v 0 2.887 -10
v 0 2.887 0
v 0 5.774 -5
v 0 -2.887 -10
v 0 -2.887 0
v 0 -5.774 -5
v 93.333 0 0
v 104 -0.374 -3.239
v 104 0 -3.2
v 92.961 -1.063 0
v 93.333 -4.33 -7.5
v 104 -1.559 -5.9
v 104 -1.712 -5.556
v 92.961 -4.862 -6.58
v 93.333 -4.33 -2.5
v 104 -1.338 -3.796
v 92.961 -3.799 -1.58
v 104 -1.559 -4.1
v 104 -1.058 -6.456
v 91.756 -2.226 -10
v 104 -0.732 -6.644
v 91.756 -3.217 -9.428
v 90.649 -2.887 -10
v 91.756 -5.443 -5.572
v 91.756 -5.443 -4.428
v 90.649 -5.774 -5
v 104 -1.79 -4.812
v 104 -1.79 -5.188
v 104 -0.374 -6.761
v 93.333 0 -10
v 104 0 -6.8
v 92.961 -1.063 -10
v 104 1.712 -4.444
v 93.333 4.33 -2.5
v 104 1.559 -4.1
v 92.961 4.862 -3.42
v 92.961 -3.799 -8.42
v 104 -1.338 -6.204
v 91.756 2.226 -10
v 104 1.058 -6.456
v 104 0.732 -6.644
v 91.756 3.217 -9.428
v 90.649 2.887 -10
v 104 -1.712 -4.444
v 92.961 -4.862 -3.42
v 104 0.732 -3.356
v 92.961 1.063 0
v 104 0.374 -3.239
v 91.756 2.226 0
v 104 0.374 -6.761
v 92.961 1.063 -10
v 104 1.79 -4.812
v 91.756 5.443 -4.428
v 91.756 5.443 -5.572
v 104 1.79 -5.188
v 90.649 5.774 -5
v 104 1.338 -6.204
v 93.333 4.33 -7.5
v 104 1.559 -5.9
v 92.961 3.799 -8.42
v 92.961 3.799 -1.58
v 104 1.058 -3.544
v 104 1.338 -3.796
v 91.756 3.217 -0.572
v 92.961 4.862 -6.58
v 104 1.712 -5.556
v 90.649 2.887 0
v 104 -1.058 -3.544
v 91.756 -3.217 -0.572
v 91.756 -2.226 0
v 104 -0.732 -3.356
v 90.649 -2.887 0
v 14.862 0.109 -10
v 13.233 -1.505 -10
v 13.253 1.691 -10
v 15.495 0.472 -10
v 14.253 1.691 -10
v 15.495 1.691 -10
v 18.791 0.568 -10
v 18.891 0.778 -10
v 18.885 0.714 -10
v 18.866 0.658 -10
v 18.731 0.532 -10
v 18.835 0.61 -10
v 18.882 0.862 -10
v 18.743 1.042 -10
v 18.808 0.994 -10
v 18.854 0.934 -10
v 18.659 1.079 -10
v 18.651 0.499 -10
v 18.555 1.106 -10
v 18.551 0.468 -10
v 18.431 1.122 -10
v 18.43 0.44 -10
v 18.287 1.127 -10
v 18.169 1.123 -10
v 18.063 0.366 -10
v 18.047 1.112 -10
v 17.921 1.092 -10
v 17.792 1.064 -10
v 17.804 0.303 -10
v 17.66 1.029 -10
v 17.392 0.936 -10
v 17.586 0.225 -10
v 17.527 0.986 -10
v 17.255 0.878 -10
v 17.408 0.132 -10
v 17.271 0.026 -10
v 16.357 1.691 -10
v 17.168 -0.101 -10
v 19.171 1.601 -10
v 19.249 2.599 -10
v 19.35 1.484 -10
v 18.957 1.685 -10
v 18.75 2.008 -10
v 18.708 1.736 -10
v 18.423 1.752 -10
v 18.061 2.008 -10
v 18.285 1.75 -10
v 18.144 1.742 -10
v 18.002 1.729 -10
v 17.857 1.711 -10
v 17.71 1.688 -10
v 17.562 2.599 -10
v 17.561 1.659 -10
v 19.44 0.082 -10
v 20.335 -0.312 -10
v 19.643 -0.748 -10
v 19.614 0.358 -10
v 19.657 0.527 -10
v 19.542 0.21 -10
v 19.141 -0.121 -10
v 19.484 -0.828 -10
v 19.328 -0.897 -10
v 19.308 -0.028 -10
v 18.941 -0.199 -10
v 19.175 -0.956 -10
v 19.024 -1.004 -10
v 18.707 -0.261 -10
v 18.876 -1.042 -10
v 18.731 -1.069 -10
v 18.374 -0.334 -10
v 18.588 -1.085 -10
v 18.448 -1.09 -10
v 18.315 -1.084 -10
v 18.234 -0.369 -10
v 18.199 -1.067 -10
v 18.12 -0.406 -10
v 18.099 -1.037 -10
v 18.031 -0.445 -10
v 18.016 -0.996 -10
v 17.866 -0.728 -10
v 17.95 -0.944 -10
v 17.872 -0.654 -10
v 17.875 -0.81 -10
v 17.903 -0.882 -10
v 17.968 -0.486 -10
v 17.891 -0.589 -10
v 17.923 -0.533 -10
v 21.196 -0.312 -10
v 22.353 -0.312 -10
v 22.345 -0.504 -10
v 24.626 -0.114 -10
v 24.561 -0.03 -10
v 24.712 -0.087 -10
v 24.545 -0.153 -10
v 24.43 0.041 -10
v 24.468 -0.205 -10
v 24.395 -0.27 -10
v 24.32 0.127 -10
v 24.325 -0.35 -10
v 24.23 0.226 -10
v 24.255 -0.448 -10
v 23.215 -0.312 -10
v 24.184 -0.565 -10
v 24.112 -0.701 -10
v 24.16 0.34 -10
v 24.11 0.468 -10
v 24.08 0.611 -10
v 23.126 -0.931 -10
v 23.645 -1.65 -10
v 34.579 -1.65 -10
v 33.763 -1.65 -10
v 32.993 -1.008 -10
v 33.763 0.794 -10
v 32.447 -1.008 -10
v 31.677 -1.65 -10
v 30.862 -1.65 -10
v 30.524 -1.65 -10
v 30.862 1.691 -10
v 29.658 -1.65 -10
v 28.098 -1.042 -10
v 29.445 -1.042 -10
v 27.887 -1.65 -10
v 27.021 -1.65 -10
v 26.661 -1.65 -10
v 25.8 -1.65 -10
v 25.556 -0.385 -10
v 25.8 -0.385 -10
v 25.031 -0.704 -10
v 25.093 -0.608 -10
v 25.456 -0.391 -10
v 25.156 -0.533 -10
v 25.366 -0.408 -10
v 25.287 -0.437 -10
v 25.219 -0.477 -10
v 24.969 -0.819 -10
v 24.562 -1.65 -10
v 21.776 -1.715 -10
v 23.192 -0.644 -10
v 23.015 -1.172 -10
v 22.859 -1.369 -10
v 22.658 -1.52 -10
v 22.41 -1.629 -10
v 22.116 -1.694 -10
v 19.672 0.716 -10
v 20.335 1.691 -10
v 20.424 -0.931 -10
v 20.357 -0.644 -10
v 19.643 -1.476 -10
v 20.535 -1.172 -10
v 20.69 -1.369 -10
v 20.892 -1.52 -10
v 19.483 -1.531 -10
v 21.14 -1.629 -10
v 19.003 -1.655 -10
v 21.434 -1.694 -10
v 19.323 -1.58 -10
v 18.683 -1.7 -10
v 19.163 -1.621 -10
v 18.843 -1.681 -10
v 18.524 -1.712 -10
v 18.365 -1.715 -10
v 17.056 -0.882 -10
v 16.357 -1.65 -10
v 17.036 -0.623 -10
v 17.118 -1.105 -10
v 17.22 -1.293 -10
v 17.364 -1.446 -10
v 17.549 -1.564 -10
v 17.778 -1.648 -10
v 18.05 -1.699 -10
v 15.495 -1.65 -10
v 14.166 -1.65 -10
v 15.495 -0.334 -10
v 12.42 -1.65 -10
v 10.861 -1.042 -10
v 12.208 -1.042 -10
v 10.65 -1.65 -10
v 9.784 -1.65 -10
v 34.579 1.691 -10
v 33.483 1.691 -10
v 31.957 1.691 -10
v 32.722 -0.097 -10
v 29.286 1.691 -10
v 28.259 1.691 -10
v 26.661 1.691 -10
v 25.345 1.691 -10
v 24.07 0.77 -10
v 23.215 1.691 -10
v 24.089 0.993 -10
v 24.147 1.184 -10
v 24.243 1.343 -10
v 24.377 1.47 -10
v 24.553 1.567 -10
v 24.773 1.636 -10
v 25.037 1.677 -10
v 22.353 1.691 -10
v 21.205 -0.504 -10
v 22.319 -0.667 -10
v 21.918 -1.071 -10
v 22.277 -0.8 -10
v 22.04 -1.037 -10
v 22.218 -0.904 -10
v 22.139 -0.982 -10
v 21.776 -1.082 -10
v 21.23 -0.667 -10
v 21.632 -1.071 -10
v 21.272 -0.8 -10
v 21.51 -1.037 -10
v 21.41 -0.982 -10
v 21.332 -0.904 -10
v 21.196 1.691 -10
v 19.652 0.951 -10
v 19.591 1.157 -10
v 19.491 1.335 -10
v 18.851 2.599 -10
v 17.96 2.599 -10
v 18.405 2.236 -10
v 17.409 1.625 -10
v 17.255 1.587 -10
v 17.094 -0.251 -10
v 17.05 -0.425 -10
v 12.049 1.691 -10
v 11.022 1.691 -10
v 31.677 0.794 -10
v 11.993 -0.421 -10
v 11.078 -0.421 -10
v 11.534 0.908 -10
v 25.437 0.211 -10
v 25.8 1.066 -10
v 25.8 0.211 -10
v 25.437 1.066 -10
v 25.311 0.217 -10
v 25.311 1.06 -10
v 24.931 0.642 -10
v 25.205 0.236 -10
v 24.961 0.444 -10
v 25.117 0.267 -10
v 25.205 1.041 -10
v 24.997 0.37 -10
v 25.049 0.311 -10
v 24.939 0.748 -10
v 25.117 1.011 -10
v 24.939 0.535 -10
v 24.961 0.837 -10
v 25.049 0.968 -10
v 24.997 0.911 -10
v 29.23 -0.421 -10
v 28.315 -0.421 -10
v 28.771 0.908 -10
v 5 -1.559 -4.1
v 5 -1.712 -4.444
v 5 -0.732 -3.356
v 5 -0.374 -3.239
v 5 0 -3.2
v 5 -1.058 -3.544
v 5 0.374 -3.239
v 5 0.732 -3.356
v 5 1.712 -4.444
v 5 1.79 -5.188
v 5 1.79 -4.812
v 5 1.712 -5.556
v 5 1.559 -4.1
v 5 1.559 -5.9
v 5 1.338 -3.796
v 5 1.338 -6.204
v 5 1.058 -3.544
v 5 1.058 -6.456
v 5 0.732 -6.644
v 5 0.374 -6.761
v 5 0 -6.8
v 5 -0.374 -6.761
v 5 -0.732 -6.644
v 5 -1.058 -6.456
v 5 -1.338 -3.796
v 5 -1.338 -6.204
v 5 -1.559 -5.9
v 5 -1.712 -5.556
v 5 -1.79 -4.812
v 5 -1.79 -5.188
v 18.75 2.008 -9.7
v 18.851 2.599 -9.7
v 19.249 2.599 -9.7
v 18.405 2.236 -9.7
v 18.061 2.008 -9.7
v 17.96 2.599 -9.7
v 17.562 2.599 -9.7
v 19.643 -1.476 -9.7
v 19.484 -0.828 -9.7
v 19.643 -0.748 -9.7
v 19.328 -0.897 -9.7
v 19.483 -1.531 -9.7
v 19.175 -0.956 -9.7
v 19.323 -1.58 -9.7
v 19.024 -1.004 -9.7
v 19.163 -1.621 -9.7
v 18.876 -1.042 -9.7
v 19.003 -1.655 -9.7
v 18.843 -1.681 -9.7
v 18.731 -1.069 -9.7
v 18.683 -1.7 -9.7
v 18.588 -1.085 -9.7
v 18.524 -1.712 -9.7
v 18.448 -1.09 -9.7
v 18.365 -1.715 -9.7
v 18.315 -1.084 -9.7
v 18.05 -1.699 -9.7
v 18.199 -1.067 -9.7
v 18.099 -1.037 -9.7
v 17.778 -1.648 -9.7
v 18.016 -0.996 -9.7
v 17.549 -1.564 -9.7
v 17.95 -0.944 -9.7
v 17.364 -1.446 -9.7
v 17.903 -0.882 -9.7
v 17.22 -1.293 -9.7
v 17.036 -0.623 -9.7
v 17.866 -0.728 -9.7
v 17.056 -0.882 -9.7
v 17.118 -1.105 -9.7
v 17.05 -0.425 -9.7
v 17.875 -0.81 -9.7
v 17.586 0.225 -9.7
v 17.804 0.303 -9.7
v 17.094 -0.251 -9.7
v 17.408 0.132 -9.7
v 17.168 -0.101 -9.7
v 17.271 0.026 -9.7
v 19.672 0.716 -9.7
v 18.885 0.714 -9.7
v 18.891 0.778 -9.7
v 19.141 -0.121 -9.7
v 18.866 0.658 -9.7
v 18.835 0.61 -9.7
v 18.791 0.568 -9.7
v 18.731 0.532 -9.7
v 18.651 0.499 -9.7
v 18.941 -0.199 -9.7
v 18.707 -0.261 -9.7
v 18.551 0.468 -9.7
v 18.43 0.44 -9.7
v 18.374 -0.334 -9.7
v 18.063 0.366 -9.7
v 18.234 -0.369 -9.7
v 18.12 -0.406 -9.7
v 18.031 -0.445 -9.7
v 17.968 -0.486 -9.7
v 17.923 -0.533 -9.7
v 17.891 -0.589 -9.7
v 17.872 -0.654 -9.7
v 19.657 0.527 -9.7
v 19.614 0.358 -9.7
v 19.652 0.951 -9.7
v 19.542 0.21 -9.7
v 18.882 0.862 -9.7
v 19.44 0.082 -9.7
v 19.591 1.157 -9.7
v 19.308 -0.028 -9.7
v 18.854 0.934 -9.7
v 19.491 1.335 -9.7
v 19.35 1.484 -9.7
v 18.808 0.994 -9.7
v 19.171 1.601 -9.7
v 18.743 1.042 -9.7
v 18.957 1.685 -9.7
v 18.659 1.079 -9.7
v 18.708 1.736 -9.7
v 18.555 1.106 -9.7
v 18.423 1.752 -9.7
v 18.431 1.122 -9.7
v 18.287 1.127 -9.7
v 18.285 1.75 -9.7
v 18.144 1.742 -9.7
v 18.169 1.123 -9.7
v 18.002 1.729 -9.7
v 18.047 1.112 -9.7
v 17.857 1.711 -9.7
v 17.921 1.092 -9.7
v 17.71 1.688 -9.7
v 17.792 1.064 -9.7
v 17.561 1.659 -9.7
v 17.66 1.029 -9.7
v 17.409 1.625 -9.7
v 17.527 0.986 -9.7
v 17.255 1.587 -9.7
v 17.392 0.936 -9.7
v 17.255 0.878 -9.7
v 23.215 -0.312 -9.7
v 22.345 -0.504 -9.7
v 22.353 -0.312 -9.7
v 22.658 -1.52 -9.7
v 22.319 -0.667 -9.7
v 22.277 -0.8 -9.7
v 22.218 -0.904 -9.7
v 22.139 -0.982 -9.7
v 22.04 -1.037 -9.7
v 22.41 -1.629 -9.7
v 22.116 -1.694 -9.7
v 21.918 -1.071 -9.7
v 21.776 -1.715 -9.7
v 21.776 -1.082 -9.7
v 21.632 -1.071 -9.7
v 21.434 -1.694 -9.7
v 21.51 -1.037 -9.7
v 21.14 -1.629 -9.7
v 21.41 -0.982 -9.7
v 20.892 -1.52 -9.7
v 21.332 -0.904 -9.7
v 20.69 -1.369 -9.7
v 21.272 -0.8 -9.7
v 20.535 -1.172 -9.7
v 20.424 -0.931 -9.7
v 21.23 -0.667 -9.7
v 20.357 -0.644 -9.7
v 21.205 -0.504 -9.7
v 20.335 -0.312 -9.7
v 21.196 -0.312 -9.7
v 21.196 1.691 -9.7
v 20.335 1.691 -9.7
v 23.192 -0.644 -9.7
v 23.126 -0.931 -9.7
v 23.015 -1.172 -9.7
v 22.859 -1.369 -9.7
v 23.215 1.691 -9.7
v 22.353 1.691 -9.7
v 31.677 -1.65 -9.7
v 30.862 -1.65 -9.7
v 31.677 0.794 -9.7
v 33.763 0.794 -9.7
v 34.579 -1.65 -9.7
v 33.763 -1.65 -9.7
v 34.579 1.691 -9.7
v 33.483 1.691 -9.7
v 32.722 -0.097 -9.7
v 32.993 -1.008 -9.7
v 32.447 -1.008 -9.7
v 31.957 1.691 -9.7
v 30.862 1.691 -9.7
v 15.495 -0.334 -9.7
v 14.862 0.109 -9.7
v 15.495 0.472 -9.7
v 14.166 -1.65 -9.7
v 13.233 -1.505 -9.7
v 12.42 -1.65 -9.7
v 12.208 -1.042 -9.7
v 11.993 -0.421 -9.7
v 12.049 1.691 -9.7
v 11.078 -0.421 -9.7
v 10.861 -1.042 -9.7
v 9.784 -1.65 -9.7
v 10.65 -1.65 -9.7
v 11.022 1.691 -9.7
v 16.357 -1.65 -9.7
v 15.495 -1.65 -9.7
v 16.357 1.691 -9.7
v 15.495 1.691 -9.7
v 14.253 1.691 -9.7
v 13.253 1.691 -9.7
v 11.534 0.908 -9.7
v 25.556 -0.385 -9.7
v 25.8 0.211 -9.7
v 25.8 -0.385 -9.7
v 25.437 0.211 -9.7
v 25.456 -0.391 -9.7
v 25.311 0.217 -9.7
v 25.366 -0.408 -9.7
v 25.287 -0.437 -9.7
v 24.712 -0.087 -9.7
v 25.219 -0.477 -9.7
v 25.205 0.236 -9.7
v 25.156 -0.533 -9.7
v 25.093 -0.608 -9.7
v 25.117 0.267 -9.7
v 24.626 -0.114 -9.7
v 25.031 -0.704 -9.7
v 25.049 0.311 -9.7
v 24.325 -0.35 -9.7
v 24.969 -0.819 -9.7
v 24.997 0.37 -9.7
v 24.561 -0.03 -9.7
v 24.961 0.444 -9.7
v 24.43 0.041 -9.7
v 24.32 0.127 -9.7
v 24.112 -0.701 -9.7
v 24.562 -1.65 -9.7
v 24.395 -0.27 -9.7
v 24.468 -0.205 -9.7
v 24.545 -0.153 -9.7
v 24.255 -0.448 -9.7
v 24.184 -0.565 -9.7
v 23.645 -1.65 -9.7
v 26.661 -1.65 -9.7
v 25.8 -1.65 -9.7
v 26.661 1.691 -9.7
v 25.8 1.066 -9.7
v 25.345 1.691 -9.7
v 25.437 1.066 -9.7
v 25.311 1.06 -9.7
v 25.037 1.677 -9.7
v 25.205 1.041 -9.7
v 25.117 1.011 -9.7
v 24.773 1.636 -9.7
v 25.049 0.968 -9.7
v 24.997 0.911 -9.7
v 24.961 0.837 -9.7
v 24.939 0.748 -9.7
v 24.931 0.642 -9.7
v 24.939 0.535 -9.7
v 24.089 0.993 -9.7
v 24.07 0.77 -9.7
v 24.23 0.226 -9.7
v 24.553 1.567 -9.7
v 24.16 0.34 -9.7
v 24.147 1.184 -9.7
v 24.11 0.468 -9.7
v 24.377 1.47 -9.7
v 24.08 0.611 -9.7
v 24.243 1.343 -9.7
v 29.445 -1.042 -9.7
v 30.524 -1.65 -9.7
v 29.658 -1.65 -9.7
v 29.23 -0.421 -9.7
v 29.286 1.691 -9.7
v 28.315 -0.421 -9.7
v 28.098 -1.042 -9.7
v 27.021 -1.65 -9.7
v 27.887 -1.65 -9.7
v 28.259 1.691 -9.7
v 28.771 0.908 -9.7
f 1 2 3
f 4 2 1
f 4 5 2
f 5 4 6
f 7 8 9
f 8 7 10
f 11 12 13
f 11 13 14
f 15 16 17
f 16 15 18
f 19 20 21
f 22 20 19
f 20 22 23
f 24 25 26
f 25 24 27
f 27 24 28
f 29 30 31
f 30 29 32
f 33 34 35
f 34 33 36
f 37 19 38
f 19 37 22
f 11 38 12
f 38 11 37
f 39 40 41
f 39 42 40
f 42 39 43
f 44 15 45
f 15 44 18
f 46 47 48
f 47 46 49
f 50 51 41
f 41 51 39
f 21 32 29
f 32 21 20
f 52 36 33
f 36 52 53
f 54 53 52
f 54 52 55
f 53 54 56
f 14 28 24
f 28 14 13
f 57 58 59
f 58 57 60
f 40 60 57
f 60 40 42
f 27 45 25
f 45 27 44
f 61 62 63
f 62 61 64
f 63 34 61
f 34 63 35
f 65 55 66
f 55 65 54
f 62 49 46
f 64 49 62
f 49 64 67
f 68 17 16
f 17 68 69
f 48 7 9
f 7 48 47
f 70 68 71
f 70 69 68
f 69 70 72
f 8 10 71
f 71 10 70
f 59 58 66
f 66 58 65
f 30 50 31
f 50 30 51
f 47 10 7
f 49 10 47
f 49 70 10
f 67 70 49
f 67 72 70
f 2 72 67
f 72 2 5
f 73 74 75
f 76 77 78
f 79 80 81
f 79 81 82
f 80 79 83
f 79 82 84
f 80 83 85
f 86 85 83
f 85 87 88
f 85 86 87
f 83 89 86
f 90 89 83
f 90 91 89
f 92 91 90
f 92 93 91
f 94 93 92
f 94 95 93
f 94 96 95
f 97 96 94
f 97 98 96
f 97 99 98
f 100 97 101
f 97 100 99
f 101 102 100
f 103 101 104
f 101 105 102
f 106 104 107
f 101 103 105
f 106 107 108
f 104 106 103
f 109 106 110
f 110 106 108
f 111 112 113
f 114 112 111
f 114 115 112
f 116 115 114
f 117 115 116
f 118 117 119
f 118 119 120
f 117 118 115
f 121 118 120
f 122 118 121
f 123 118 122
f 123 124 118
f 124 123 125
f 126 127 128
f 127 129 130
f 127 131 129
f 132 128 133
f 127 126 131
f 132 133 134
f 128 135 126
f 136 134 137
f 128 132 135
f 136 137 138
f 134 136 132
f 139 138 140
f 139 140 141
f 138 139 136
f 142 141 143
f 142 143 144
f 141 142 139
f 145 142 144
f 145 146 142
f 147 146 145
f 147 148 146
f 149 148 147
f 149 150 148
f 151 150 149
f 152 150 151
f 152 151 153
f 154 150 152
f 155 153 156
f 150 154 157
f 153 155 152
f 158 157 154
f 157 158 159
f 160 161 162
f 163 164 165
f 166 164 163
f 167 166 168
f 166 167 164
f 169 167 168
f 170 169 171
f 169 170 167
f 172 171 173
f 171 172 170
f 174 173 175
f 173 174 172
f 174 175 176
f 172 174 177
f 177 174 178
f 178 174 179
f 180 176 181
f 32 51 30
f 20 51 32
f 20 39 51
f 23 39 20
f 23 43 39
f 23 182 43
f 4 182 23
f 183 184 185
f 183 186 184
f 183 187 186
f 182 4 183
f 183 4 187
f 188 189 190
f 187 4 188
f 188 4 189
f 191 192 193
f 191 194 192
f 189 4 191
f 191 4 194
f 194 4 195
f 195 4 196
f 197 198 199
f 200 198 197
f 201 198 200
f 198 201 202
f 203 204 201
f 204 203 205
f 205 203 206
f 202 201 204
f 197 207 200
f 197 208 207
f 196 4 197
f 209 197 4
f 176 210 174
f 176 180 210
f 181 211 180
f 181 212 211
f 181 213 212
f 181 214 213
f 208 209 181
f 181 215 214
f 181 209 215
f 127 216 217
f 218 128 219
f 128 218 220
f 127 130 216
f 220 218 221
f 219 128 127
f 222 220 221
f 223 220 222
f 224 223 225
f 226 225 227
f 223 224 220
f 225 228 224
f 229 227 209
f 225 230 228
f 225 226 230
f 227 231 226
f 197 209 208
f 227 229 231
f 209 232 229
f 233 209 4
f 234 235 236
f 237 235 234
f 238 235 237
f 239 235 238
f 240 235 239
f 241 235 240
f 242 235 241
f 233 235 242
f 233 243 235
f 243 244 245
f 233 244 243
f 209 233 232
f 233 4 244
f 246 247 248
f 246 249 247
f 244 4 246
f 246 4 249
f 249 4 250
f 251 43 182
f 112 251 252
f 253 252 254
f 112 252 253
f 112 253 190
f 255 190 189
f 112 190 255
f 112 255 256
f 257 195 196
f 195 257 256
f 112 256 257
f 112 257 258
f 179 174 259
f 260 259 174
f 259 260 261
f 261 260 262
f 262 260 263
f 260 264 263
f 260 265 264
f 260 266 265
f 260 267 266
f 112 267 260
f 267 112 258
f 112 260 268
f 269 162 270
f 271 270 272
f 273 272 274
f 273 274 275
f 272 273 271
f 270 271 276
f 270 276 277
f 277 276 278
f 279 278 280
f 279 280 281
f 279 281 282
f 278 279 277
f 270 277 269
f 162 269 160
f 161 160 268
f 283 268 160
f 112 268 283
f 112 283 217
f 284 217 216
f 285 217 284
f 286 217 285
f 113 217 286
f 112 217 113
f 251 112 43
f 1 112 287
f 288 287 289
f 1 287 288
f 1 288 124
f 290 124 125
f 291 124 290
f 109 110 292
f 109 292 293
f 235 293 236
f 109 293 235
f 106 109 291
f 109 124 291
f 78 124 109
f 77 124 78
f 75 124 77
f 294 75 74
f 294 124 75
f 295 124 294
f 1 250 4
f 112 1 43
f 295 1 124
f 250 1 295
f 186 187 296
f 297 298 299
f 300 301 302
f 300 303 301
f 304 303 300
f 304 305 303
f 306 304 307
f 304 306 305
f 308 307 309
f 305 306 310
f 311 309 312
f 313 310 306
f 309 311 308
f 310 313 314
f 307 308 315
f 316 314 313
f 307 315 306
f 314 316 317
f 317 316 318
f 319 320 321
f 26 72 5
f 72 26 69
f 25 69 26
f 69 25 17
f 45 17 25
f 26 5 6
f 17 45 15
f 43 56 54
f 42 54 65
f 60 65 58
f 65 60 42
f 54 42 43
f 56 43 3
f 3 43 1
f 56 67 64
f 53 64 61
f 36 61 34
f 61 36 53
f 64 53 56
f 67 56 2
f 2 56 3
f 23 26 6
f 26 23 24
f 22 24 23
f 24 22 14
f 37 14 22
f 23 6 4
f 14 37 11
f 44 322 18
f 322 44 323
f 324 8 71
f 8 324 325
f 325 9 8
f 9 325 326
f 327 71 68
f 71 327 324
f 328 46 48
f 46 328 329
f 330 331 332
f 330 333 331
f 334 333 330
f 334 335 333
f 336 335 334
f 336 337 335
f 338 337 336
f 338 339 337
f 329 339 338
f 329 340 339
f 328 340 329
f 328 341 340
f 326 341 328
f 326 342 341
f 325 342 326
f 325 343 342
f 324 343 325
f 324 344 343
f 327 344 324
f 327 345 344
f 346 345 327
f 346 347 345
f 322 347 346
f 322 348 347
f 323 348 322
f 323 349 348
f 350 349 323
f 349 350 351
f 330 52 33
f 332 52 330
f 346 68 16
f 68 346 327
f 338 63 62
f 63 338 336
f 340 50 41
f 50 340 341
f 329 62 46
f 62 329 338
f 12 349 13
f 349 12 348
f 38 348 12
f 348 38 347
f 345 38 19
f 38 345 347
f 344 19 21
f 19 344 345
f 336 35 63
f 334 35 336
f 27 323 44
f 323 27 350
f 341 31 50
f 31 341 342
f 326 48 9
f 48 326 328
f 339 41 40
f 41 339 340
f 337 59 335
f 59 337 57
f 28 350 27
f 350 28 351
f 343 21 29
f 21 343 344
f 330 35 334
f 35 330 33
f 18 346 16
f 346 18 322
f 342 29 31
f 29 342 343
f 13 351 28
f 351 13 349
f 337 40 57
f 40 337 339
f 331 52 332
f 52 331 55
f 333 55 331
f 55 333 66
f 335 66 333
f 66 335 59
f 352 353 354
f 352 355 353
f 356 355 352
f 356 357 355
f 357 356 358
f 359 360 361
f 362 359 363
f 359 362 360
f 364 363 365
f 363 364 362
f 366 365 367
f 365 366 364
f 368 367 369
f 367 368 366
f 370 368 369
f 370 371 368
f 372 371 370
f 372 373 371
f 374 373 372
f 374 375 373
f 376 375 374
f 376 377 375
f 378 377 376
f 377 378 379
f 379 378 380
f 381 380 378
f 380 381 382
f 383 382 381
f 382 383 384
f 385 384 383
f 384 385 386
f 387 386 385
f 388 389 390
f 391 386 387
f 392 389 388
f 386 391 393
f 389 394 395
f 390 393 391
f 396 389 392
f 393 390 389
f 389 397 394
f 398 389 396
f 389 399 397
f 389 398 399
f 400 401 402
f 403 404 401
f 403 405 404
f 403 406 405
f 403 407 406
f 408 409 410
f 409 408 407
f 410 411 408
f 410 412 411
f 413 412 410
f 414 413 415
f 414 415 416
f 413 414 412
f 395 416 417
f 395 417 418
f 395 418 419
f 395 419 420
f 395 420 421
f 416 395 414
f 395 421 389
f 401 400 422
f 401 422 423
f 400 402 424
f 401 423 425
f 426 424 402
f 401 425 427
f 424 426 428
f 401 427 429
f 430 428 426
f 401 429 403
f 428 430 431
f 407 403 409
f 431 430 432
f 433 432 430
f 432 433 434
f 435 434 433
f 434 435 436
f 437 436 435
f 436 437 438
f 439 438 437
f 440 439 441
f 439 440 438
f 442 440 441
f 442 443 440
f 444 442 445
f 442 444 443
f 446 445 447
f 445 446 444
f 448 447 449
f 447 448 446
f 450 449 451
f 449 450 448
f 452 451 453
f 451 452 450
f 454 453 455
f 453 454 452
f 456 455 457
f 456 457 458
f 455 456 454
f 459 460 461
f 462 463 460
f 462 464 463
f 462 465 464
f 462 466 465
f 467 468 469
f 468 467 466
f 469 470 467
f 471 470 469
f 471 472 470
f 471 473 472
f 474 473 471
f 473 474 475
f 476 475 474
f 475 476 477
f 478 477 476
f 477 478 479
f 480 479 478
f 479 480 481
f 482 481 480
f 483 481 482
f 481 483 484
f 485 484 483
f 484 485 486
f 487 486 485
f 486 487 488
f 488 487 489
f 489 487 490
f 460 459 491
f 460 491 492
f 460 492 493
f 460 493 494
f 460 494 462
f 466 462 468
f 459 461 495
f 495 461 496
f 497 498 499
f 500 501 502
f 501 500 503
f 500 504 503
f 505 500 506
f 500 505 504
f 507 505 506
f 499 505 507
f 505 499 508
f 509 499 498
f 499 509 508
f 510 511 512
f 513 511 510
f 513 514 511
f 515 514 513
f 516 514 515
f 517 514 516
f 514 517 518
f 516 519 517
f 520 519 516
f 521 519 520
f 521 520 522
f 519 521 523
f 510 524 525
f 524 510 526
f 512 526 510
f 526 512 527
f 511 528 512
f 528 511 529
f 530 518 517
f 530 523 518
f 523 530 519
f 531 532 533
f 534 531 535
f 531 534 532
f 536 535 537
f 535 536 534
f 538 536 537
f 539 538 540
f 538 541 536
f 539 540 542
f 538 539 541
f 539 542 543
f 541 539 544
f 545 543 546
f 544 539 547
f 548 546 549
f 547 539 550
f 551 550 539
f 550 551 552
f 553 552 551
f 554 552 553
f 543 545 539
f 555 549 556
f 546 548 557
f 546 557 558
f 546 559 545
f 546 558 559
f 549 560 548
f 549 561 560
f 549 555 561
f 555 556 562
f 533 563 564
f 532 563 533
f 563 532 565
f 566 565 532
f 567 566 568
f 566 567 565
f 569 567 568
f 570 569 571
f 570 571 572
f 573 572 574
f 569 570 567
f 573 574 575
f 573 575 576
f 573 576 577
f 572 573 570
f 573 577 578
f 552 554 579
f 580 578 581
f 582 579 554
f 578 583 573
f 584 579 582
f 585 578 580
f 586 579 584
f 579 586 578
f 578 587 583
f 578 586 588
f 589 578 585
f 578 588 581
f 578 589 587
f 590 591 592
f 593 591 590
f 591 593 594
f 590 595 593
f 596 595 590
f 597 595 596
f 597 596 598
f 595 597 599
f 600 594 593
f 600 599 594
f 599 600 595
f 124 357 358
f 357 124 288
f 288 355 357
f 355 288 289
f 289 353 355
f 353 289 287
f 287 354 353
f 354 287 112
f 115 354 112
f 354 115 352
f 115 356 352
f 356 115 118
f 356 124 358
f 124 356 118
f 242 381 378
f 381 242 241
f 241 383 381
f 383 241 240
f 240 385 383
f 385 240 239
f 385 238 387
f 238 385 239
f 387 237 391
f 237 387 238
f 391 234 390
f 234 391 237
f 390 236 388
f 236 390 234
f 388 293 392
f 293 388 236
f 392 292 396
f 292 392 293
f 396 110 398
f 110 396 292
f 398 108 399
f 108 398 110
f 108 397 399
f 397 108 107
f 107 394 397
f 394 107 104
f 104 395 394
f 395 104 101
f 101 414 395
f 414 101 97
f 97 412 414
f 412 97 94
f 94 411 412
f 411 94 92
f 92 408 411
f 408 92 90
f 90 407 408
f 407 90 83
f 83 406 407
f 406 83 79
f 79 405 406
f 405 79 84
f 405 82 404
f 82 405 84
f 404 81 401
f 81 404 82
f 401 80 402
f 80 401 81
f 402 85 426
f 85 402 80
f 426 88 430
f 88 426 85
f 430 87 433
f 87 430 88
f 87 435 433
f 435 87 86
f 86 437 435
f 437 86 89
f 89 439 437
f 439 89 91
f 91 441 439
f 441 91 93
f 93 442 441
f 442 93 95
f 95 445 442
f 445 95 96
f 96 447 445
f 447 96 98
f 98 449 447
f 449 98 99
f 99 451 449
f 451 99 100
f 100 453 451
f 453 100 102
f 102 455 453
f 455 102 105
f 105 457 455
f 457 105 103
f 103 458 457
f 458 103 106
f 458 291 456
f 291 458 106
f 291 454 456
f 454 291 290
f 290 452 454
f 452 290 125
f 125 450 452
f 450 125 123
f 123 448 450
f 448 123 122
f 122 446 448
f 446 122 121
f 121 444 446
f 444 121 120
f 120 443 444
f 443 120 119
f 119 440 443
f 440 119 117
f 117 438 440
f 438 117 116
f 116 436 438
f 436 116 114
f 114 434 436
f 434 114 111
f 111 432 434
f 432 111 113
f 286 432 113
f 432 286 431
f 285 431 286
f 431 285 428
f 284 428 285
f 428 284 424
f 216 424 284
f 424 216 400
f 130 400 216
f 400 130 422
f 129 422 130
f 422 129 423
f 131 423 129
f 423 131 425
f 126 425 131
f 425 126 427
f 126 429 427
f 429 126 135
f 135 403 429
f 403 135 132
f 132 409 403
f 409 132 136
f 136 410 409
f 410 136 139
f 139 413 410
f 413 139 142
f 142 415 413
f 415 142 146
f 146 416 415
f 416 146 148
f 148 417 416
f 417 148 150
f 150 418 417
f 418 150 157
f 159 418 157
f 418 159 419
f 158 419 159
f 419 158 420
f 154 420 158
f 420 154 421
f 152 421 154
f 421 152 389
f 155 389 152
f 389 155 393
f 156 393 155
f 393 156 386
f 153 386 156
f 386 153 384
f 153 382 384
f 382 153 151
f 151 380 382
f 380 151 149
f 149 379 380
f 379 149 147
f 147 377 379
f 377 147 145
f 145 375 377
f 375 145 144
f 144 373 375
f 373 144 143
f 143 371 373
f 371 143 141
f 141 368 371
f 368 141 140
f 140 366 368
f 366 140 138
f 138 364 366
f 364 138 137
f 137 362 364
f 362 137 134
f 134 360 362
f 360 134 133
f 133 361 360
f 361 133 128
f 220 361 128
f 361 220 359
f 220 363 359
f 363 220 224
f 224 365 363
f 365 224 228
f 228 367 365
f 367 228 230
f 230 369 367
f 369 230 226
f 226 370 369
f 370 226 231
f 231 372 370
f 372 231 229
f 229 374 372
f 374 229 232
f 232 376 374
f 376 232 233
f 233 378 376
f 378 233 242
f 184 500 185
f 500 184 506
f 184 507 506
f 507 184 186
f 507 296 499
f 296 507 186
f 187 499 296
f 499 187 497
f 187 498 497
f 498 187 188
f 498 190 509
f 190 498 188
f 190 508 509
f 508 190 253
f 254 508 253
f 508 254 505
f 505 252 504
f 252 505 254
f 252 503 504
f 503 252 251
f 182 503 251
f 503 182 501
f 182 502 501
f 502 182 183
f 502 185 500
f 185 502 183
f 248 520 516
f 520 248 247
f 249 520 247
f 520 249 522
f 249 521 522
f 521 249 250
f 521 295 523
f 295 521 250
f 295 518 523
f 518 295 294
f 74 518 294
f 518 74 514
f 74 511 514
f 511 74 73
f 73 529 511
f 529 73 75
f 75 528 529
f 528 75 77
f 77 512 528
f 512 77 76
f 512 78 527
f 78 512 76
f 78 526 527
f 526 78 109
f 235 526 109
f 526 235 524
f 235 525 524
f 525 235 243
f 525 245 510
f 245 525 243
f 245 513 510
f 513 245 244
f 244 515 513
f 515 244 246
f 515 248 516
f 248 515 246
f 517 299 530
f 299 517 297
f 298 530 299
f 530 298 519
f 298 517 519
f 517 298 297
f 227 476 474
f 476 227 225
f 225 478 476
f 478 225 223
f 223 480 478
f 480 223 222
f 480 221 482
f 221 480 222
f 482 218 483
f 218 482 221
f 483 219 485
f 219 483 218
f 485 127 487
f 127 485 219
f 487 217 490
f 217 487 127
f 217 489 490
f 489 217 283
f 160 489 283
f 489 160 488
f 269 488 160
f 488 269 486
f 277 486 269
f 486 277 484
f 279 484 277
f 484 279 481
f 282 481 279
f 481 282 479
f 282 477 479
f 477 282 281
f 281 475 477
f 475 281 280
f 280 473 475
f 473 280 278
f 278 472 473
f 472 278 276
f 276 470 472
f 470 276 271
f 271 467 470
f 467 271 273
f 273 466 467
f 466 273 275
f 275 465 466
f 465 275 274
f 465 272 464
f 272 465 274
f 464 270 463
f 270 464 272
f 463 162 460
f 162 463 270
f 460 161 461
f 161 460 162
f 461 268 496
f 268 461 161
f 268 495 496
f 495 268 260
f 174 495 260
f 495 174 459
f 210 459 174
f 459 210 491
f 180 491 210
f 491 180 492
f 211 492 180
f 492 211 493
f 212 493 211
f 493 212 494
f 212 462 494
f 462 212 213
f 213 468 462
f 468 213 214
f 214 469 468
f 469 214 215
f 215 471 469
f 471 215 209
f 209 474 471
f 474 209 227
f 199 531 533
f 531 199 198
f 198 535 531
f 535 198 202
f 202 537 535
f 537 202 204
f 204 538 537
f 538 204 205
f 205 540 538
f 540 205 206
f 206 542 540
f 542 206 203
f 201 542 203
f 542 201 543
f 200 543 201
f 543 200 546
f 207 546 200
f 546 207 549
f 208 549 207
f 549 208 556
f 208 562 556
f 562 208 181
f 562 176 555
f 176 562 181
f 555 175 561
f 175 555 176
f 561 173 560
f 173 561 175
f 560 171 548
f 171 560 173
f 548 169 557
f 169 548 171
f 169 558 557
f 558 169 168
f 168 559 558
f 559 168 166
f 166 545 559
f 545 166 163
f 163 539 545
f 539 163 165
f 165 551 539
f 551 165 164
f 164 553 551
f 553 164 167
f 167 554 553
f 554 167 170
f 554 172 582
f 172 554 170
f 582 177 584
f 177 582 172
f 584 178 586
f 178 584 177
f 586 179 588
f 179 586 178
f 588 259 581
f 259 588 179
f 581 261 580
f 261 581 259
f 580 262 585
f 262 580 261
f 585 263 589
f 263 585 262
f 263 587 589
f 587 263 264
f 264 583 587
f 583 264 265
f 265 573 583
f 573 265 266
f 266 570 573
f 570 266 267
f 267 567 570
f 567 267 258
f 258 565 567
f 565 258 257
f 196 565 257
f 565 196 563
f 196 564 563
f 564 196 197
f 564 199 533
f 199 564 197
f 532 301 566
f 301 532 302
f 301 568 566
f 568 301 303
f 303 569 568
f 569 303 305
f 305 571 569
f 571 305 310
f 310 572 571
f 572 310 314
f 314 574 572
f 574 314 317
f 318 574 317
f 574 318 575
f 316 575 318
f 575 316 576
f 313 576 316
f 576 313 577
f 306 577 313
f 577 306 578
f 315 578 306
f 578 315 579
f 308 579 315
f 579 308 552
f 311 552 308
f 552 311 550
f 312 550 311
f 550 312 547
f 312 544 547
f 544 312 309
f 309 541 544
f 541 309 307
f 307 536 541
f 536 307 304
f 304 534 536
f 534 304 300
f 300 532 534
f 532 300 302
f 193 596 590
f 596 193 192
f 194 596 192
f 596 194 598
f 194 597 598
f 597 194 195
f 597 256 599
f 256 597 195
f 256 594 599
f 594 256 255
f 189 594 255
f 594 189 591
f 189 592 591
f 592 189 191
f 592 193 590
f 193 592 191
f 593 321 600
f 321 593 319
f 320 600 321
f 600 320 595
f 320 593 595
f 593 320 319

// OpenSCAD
$fn = 30;

delka = 100;

r=5;
t="MARUŠKA";
dd=65;

rotate([180,0,0]) difference() {
    translate([0,0,r]) rotate([0,90,0]) difference() {
        intersection() {
            union() {
                cylinder(h=delka-10, r=r+1);
                translate([0,0,delka-10]) cylinder(h=20, r1=r+1, r2=0);
            }
            translate([0,0,delka/2-1]) Hexagone(cle=2*r,h=delka*2);
        }
        translate([0,0,5]) cylinder(h=delka*2, r=1.8);
    }
    translate([delka-dd,.33*r,2*r-.3]) scale(.33) rotate([0,0,180]) linear_extrude(height = 1) {
        text(t, font = "Sans Bold:style=bold");
    }
}

*rotate([180,0,0]) translate([delka-dd,.33*r,2*r-.3]) scale(.33) rotate([0,0,180]) linear_extrude(height = 1) {
    text(t, font = "Sans Bold:style=bold");
}

module Hexagone(cle,h) {
	angle = 360/6;		// 6 pans
	cote = cle * cot(angle);

	union()
	{
		rotate([0,0,0])
			cube([cle,cote,h],center=true);
		rotate([0,0,angle])
			cube([cle,cote,h],center=true);
		rotate([0,0,2*angle])
			cube([cle,cote,h],center=true);
	}
}


function cot(x)=1/tan(x);
